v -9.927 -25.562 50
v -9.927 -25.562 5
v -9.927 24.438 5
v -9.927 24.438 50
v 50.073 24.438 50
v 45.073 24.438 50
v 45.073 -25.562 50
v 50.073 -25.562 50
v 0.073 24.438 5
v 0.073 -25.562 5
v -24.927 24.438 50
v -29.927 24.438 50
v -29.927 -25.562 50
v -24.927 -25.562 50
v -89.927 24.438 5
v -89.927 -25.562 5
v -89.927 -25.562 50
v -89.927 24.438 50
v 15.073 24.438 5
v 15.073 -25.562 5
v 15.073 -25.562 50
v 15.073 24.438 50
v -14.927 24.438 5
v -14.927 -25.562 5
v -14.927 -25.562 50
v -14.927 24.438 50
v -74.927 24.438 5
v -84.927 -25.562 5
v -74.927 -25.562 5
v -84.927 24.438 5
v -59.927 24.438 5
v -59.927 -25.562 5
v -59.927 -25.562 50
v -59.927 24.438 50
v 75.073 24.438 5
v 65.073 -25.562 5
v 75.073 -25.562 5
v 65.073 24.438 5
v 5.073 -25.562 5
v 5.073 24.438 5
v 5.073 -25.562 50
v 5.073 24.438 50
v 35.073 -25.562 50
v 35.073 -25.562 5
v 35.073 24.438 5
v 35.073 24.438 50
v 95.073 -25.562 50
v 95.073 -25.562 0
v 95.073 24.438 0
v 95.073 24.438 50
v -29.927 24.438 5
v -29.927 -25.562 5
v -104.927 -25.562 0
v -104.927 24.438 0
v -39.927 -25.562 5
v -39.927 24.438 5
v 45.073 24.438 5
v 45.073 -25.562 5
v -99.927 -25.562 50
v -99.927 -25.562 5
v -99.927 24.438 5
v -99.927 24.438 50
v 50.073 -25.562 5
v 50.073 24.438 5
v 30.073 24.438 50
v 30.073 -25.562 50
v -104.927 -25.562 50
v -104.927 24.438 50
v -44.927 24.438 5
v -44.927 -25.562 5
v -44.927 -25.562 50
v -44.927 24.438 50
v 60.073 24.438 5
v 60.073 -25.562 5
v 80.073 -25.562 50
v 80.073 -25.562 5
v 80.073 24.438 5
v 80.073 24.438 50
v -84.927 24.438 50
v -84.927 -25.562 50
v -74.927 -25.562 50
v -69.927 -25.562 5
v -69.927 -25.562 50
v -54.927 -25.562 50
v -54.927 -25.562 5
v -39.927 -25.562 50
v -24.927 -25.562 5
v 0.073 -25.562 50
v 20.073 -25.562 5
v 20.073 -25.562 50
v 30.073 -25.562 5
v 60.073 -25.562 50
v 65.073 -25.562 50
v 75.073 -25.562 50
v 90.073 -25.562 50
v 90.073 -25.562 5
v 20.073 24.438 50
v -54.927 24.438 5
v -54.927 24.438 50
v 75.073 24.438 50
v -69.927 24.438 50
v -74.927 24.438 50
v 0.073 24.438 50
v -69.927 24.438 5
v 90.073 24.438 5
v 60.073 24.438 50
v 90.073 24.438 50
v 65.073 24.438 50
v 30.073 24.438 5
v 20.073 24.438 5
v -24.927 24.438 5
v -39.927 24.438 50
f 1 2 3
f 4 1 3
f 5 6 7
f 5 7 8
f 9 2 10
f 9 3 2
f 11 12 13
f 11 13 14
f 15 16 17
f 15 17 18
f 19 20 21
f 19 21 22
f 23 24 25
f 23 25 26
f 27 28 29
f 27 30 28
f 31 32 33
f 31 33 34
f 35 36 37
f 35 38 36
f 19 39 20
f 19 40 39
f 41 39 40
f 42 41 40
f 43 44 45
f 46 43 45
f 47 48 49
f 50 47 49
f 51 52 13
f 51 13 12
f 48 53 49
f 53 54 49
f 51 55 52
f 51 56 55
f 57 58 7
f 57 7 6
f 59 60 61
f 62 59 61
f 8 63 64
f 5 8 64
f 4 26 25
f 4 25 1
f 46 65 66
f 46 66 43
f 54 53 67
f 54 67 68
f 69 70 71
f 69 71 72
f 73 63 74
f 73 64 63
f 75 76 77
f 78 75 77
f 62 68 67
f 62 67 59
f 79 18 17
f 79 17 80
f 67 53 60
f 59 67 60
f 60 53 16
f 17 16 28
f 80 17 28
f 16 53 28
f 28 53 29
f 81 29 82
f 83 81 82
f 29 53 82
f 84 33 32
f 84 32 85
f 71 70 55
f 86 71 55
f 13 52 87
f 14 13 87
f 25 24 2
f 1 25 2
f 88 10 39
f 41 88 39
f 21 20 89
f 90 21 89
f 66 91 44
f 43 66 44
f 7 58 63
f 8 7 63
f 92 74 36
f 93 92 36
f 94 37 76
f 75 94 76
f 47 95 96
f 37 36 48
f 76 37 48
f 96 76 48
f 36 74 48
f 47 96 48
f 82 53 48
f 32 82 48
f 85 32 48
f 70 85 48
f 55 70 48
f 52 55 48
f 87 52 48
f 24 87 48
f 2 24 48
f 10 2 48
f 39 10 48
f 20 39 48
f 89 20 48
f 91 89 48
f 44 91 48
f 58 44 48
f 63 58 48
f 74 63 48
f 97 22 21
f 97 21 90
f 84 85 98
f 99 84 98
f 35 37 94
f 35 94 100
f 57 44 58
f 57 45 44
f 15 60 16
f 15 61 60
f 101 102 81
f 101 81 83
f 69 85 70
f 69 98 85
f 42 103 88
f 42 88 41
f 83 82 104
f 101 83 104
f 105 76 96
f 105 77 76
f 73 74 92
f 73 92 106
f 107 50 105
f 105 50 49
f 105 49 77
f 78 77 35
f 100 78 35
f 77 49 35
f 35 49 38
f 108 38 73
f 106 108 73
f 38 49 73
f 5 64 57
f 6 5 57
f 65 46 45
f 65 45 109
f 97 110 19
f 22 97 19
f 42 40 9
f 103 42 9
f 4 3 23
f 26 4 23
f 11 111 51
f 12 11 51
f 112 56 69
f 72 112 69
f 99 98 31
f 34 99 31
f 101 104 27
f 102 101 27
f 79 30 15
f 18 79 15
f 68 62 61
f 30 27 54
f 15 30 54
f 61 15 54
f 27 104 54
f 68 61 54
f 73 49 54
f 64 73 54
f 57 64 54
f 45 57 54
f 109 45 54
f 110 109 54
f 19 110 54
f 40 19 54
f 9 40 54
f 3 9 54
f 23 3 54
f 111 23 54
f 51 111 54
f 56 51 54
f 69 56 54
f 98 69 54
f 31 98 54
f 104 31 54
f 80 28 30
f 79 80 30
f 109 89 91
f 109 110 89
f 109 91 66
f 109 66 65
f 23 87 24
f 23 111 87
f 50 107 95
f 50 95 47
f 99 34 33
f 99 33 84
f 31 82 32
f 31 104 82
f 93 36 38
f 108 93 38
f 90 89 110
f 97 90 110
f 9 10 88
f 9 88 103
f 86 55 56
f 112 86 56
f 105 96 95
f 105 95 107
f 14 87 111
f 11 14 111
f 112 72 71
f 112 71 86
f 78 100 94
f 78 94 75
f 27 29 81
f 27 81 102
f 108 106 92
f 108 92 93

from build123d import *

# Parameters (mm, degrees)
F0_W     = 5
F0_H     = 50
F0_W_2   = 10
F1_DEPTH = 5
F2_DEPTH = 50


with BuildPart() as f1:
    # F0 (on Top) → F1 (new body)
    with BuildSketch(Plane.XY):
        with Locations((62.572898, -0.562236)):
            Rectangle(F0_W, F0_H)
        with Locations((40.072898, -0.562236)):
            Rectangle(F0_W_2, F0_H)
        with Locations((32.572898, -0.562236)):
            Rectangle(F0_W, F0_H)
        with Locations((-57.427102, -0.562236)):
            Rectangle(F0_W, F0_H)
        with Locations((2.572898, -0.562236)):
            Rectangle(F0_W, F0_H)
        with Locations((-94.927102, -0.562236)):
            Rectangle(F0_W_2, F0_H)
        with Locations((85.072898, -0.562236)):
            Rectangle(F0_W_2, F0_H)
        with Locations((77.572898, -0.562236)):
            Rectangle(F0_W, F0_H)
        with Locations((-4.927102, -0.562236)):
            Rectangle(F0_W_2, F0_H)
        with Locations((-34.927102, -0.562236)):
            Rectangle(F0_W_2, F0_H)
        with Locations((92.572898, -0.562236)):
            Rectangle(F0_W, F0_H)
        with Locations((-72.427102, -0.562236)):
            Rectangle(F0_W, F0_H)
        with Locations((70.072898, -0.562236)):
            Rectangle(F0_W_2, F0_H)
        with Locations((-42.427102, -0.562236)):
            Rectangle(F0_W, F0_H)
        with Locations((-49.927102, -0.562236)):
            Rectangle(F0_W_2, F0_H)
        with Locations((25.072898, -0.562236)):
            Rectangle(F0_W_2, F0_H)
        with Locations((10.072898, -0.562236)):
            Rectangle(F0_W_2, F0_H)
        with Locations((-64.927102, -0.562236)):
            Rectangle(F0_W_2, F0_H)
        with Locations((47.572898, -0.562236)):
            Rectangle(F0_W, F0_H)
        with Locations((-79.927102, -0.562236)):
            Rectangle(F0_W_2, F0_H)
        with Locations((-27.427102, -0.562236)):
            Rectangle(F0_W, F0_H)
        with Locations((-102.427102, -0.562236)):
            Rectangle(F0_W, F0_H)
        with Locations((-12.427102, -0.562236)):
            Rectangle(F0_W, F0_H)
        with Locations((-19.927102, -0.562236)):
            Rectangle(F0_W_2, F0_H)
        with Locations((-87.427102, -0.562236)):
            Rectangle(F0_W, F0_H)
        with Locations((55.072898, -0.562236)):
            Rectangle(F0_W_2, F0_H)
        with Locations((17.572898, -0.562236)):
            Rectangle(F0_W, F0_H)
    extrude(amount=F1_DEPTH)

    # F0 (on Top) → F2 (join)
    with BuildSketch(Plane.XY):
        with Locations((-102.427102, -0.562236)):
            Rectangle(F0_W, F0_H)
        with Locations((-87.427102, -0.562236)):
            Rectangle(F0_W, F0_H)
        with Locations((-72.427102, -0.562236)):
            Rectangle(F0_W, F0_H)
        with Locations((-57.427102, -0.562236)):
            Rectangle(F0_W, F0_H)
        with Locations((-42.427102, -0.562236)):
            Rectangle(F0_W, F0_H)
        with Locations((-27.427102, -0.562236)):
            Rectangle(F0_W, F0_H)
        with Locations((-12.427102, -0.562236)):
            Rectangle(F0_W, F0_H)
        with Locations((2.572898, -0.562236)):
            Rectangle(F0_W, F0_H)
        with Locations((17.572898, -0.562236)):
            Rectangle(F0_W, F0_H)
        with Locations((32.572898, -0.562236)):
            Rectangle(F0_W, F0_H)
        with Locations((47.572898, -0.562236)):
            Rectangle(F0_W, F0_H)
        with Locations((62.572898, -0.562236)):
            Rectangle(F0_W, F0_H)
        with Locations((77.572898, -0.562236)):
            Rectangle(F0_W, F0_H)
        with Locations((92.572898, -0.562236)):
            Rectangle(F0_W, F0_H)
    extrude(amount=F2_DEPTH)


solid = f1.part
